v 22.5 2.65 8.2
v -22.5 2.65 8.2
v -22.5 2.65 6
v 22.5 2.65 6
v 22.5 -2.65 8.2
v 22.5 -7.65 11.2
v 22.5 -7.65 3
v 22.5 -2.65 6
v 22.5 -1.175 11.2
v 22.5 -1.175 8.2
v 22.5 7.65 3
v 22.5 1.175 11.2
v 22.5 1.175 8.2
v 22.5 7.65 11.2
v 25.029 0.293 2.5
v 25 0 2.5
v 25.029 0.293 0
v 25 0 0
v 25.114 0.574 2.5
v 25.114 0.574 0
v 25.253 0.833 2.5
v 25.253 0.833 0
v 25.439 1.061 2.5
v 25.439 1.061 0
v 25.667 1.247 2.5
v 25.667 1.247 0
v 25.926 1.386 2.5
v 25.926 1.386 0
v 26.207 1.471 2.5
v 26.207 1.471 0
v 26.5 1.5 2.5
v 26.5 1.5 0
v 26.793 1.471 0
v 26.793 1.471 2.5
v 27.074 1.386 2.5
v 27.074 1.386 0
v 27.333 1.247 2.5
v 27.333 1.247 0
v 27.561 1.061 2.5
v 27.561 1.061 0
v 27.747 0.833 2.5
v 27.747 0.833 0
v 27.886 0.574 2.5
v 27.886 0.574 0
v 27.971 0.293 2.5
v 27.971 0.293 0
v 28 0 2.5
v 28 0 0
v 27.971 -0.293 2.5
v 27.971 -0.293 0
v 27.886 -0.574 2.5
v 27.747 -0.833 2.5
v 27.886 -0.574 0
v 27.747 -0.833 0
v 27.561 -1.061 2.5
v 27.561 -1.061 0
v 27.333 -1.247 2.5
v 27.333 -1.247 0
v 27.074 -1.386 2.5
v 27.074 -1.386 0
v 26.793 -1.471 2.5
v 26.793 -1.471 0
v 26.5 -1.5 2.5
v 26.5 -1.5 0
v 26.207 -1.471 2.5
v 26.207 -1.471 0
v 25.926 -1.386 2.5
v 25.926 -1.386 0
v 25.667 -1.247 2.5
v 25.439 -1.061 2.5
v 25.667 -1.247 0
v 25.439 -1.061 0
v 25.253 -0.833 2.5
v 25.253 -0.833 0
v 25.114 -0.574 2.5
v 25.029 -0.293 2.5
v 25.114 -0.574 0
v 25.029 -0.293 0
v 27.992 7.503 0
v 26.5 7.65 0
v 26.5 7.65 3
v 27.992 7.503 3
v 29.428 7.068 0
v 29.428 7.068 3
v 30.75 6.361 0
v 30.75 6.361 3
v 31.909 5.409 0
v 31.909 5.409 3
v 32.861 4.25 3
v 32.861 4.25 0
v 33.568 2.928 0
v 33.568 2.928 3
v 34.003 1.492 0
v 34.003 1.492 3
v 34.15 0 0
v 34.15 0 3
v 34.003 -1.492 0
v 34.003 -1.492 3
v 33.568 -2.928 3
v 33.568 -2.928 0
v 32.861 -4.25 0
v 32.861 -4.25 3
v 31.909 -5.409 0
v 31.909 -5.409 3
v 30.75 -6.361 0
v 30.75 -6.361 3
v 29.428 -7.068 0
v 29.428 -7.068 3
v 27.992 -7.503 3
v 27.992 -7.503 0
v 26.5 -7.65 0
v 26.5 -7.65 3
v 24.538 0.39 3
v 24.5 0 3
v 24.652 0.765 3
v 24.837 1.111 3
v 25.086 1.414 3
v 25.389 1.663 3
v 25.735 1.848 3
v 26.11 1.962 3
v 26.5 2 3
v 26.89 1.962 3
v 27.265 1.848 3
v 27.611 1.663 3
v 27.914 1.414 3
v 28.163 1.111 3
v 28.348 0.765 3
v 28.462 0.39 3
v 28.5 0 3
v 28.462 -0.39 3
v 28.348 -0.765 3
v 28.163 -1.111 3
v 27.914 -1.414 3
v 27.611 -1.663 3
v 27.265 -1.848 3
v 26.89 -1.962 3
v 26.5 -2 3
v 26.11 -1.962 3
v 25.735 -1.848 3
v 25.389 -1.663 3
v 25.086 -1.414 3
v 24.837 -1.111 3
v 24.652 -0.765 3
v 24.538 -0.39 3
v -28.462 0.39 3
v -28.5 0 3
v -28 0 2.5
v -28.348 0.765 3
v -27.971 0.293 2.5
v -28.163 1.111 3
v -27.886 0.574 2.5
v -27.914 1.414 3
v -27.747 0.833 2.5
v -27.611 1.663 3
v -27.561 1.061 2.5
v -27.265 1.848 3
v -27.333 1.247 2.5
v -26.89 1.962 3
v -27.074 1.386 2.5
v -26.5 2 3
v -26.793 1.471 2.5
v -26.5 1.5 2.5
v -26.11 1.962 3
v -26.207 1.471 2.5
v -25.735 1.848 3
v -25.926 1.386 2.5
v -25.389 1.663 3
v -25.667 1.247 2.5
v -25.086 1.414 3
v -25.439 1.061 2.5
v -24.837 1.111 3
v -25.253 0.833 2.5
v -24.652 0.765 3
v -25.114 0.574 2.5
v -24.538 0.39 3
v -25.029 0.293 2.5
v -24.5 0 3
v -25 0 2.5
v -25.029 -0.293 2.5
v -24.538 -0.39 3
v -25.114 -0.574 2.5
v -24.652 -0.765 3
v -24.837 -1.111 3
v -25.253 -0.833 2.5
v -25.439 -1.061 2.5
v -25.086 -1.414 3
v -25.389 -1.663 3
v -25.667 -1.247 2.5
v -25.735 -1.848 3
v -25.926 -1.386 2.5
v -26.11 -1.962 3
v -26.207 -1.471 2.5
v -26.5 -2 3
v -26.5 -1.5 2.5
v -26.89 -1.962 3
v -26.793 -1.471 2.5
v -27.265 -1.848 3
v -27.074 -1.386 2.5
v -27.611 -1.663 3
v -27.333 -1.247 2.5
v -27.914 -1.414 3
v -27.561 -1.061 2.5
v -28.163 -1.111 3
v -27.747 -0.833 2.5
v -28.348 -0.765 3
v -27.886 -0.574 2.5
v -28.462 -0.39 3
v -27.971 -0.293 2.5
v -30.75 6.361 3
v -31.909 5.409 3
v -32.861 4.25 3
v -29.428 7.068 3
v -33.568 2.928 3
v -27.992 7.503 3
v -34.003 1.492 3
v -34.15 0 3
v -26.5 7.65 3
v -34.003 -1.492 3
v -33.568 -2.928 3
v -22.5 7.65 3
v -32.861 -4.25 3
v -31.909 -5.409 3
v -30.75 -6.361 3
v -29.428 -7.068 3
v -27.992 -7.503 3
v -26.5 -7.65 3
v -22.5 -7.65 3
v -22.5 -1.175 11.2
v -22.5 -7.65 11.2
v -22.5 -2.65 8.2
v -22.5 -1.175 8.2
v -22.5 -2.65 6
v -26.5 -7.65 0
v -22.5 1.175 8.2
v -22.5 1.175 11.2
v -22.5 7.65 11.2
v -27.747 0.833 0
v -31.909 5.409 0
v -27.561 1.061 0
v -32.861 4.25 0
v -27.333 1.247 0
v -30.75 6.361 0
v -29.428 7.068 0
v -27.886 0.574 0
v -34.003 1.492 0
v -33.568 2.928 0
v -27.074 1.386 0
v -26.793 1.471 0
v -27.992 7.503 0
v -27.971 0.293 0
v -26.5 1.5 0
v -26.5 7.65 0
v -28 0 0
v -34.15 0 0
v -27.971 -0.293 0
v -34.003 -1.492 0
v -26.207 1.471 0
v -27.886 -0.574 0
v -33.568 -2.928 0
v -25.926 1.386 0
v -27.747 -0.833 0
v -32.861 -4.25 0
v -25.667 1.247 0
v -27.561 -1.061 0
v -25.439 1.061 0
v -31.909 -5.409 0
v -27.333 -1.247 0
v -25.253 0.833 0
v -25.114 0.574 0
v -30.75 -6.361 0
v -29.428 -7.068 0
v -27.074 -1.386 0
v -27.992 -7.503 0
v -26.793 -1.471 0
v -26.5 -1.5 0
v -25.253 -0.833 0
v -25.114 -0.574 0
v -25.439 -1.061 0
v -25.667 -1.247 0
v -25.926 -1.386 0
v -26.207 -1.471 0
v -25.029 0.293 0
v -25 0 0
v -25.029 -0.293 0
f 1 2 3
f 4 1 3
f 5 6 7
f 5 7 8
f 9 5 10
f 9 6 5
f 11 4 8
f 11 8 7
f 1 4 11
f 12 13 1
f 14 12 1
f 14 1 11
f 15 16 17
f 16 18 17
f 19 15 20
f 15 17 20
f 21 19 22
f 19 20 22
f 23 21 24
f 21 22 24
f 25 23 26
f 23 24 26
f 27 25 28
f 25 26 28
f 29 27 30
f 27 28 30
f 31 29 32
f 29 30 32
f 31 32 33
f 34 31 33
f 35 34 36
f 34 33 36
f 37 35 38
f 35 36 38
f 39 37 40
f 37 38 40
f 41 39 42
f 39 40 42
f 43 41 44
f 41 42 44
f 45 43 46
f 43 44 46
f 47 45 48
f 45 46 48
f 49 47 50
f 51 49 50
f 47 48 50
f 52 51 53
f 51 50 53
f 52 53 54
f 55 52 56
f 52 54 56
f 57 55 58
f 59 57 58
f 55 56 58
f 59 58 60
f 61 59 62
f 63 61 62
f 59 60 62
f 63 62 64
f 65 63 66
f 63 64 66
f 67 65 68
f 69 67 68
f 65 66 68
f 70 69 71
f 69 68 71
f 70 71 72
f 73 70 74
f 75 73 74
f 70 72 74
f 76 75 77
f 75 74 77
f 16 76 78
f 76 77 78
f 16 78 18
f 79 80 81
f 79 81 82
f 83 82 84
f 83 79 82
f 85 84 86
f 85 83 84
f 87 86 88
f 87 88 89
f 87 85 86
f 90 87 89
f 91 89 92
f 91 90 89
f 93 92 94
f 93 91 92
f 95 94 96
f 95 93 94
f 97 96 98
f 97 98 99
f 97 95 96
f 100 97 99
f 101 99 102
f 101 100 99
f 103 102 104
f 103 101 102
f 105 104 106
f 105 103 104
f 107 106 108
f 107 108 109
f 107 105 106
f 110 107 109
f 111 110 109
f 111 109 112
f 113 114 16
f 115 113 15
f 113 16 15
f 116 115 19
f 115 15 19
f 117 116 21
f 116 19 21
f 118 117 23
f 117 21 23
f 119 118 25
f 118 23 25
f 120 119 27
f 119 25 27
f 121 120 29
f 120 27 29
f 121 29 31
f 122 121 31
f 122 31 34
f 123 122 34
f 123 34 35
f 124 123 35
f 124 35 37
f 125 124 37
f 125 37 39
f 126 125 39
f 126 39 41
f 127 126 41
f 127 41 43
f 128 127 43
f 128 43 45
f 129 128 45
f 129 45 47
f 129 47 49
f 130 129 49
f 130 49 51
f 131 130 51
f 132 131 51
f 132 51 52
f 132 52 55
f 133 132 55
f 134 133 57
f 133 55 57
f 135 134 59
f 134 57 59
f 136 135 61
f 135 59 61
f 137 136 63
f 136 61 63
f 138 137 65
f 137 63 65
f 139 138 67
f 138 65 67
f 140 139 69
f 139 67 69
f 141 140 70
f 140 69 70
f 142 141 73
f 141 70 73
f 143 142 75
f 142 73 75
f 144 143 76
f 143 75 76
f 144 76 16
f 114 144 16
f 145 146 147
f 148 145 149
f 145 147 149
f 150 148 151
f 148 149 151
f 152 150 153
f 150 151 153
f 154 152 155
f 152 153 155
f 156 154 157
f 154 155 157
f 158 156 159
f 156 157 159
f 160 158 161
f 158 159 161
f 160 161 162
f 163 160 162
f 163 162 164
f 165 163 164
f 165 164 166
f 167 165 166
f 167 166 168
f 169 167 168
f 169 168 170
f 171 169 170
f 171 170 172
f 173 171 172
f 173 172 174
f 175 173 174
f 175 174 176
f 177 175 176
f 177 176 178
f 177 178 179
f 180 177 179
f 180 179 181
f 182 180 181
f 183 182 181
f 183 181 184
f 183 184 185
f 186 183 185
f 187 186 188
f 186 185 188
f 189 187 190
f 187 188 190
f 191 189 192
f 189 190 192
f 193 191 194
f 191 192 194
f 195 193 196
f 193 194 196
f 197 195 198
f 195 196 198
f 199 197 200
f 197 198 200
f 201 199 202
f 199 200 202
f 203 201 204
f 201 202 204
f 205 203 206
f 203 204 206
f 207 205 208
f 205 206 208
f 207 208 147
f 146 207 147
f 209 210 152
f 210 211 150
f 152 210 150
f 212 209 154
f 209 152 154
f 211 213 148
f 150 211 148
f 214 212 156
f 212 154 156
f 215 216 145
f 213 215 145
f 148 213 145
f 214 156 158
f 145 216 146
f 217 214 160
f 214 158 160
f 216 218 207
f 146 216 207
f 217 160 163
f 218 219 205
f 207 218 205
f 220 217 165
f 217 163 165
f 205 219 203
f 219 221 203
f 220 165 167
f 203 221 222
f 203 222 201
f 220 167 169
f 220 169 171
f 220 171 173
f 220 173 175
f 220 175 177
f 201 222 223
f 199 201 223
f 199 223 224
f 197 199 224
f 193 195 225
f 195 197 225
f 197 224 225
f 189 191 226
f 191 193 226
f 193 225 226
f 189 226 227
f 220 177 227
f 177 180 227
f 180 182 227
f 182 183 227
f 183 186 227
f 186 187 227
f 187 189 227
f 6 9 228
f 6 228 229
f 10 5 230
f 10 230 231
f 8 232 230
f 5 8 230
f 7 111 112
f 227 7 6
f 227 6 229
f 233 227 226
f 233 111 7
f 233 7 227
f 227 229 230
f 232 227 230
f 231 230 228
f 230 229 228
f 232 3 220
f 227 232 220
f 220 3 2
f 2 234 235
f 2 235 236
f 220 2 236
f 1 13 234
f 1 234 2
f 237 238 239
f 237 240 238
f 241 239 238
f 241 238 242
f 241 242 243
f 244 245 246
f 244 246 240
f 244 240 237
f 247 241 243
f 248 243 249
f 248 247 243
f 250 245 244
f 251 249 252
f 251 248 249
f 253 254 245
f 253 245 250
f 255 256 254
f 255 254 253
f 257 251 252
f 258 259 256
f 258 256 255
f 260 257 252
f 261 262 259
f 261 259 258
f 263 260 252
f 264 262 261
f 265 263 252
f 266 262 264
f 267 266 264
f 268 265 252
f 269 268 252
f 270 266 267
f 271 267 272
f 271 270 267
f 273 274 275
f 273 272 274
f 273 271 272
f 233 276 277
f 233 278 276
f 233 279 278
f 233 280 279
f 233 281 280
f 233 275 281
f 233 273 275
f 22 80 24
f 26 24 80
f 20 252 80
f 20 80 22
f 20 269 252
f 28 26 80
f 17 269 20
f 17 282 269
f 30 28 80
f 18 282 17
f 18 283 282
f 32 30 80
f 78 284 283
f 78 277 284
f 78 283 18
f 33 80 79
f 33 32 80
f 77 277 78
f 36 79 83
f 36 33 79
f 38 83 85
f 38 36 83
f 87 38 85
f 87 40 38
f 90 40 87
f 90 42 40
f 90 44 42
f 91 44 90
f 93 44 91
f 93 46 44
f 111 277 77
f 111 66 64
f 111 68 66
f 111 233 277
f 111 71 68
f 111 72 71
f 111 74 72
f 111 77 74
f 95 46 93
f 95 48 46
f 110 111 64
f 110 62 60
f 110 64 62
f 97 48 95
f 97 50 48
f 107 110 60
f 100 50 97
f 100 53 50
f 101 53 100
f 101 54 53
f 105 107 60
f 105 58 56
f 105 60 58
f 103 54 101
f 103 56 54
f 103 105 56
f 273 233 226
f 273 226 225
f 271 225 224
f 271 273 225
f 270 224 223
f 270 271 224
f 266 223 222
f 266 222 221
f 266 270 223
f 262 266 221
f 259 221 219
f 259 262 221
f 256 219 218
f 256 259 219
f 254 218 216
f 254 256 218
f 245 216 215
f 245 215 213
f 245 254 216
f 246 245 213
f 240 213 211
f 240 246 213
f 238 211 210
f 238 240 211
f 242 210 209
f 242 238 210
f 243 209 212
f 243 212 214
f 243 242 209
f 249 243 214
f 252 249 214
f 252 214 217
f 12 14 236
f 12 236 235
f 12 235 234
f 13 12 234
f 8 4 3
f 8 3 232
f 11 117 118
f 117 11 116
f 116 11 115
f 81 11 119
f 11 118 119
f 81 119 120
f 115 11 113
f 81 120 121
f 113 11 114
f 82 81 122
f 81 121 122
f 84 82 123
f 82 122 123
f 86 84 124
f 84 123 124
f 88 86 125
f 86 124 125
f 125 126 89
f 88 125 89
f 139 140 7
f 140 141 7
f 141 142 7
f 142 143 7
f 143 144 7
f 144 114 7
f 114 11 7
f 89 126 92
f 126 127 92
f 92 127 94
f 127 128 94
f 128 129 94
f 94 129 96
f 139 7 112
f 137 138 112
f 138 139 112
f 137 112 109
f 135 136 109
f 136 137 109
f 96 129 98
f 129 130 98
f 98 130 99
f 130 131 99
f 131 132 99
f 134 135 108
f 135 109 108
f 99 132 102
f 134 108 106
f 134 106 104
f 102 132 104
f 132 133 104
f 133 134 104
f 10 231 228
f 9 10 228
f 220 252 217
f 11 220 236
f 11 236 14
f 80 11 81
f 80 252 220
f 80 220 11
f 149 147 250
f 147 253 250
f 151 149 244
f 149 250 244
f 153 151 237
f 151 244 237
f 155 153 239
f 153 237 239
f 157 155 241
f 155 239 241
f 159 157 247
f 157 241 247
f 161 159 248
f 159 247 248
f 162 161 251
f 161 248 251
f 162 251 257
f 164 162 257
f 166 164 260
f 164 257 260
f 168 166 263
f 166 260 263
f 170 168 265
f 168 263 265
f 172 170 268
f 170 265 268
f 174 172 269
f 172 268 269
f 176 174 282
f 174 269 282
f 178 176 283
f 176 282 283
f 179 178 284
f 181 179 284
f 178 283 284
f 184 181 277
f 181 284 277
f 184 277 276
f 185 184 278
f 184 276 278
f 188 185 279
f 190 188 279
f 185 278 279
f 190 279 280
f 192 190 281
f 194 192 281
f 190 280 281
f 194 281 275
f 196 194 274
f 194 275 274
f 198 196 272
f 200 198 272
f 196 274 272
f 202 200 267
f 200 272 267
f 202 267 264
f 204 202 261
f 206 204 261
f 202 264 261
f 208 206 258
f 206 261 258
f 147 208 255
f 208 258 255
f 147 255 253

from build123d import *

# Parameters (mm, degrees)
F1_DEPTH       = 22.5
F2_W           = 45
F2_H           = 15.3
F3_DEPTH       = 3
F5_D           = 3
F5_DEPTH       = 4
F5_CSINK_D     = 4
F5_CSINK_ANGLE = 90
F5_TIP         = 0.9012909285


with BuildPart() as f1:
    # F0 (on Right) → F1 (new body, symmetric)
    with BuildSketch(Plane.YZ):
        Polygon((7.65, 0), (7.65, 11.2), (1.175, 11.2), (1.175, 8.2), (2.65, 8.2), (2.65, 6), (0, 6), (0, 0), align=None)
        Polygon((-7.65, 0), (0, 0), (0, 6), (-2.65, 6), (-2.65, 8.2), (-1.175, 8.2), (-1.175, 11.2), (-7.65, 11.2), align=None)
    extrude(amount=F1_DEPTH, both=True)

    # F2 (on face) → F3 (join)
    with BuildSketch(Plane(origin=(0, 0, 0), x_dir=(1, 0, 0), z_dir=(0, 0, -1))):
        with BuildLine():
            Line((22.5, 7.65), (22.5, -7.65))
            Line((22.5, -7.65), (26.5, -7.65))
            ThreePointArc((26.5, -7.65), (34.15, 0), (26.5, 7.65))
            Line((26.5, 7.65), (22.5, 7.65))
        make_face()
        Rectangle(F2_W, F2_H)
        with BuildLine():
            Line((-26.5, -7.65), (-22.5, -7.65))
            Line((-22.5, -7.65), (-22.5, 7.65))
            Line((-22.5, 7.65), (-26.5, 7.65))
            ThreePointArc((-26.5, 7.65), (-34.15, 0), (-26.5, -7.65))
        make_face()
    extrude(amount=-F3_DEPTH)

    # F5
    with Locations(Plane.XY.offset(3)):
        with Locations((26.5, 0), (-26.5, 0)):
            CounterSinkHole(F5_D / 2, F5_CSINK_D / 2, depth=F5_DEPTH, counter_sink_angle=F5_CSINK_ANGLE)
            with Locations((0, 0, -(F5_DEPTH + F5_TIP / 2))):  # 118° drill point
                Cone(0, F5_D / 2, F5_TIP, mode=Mode.SUBTRACT)


solid = f1.part
